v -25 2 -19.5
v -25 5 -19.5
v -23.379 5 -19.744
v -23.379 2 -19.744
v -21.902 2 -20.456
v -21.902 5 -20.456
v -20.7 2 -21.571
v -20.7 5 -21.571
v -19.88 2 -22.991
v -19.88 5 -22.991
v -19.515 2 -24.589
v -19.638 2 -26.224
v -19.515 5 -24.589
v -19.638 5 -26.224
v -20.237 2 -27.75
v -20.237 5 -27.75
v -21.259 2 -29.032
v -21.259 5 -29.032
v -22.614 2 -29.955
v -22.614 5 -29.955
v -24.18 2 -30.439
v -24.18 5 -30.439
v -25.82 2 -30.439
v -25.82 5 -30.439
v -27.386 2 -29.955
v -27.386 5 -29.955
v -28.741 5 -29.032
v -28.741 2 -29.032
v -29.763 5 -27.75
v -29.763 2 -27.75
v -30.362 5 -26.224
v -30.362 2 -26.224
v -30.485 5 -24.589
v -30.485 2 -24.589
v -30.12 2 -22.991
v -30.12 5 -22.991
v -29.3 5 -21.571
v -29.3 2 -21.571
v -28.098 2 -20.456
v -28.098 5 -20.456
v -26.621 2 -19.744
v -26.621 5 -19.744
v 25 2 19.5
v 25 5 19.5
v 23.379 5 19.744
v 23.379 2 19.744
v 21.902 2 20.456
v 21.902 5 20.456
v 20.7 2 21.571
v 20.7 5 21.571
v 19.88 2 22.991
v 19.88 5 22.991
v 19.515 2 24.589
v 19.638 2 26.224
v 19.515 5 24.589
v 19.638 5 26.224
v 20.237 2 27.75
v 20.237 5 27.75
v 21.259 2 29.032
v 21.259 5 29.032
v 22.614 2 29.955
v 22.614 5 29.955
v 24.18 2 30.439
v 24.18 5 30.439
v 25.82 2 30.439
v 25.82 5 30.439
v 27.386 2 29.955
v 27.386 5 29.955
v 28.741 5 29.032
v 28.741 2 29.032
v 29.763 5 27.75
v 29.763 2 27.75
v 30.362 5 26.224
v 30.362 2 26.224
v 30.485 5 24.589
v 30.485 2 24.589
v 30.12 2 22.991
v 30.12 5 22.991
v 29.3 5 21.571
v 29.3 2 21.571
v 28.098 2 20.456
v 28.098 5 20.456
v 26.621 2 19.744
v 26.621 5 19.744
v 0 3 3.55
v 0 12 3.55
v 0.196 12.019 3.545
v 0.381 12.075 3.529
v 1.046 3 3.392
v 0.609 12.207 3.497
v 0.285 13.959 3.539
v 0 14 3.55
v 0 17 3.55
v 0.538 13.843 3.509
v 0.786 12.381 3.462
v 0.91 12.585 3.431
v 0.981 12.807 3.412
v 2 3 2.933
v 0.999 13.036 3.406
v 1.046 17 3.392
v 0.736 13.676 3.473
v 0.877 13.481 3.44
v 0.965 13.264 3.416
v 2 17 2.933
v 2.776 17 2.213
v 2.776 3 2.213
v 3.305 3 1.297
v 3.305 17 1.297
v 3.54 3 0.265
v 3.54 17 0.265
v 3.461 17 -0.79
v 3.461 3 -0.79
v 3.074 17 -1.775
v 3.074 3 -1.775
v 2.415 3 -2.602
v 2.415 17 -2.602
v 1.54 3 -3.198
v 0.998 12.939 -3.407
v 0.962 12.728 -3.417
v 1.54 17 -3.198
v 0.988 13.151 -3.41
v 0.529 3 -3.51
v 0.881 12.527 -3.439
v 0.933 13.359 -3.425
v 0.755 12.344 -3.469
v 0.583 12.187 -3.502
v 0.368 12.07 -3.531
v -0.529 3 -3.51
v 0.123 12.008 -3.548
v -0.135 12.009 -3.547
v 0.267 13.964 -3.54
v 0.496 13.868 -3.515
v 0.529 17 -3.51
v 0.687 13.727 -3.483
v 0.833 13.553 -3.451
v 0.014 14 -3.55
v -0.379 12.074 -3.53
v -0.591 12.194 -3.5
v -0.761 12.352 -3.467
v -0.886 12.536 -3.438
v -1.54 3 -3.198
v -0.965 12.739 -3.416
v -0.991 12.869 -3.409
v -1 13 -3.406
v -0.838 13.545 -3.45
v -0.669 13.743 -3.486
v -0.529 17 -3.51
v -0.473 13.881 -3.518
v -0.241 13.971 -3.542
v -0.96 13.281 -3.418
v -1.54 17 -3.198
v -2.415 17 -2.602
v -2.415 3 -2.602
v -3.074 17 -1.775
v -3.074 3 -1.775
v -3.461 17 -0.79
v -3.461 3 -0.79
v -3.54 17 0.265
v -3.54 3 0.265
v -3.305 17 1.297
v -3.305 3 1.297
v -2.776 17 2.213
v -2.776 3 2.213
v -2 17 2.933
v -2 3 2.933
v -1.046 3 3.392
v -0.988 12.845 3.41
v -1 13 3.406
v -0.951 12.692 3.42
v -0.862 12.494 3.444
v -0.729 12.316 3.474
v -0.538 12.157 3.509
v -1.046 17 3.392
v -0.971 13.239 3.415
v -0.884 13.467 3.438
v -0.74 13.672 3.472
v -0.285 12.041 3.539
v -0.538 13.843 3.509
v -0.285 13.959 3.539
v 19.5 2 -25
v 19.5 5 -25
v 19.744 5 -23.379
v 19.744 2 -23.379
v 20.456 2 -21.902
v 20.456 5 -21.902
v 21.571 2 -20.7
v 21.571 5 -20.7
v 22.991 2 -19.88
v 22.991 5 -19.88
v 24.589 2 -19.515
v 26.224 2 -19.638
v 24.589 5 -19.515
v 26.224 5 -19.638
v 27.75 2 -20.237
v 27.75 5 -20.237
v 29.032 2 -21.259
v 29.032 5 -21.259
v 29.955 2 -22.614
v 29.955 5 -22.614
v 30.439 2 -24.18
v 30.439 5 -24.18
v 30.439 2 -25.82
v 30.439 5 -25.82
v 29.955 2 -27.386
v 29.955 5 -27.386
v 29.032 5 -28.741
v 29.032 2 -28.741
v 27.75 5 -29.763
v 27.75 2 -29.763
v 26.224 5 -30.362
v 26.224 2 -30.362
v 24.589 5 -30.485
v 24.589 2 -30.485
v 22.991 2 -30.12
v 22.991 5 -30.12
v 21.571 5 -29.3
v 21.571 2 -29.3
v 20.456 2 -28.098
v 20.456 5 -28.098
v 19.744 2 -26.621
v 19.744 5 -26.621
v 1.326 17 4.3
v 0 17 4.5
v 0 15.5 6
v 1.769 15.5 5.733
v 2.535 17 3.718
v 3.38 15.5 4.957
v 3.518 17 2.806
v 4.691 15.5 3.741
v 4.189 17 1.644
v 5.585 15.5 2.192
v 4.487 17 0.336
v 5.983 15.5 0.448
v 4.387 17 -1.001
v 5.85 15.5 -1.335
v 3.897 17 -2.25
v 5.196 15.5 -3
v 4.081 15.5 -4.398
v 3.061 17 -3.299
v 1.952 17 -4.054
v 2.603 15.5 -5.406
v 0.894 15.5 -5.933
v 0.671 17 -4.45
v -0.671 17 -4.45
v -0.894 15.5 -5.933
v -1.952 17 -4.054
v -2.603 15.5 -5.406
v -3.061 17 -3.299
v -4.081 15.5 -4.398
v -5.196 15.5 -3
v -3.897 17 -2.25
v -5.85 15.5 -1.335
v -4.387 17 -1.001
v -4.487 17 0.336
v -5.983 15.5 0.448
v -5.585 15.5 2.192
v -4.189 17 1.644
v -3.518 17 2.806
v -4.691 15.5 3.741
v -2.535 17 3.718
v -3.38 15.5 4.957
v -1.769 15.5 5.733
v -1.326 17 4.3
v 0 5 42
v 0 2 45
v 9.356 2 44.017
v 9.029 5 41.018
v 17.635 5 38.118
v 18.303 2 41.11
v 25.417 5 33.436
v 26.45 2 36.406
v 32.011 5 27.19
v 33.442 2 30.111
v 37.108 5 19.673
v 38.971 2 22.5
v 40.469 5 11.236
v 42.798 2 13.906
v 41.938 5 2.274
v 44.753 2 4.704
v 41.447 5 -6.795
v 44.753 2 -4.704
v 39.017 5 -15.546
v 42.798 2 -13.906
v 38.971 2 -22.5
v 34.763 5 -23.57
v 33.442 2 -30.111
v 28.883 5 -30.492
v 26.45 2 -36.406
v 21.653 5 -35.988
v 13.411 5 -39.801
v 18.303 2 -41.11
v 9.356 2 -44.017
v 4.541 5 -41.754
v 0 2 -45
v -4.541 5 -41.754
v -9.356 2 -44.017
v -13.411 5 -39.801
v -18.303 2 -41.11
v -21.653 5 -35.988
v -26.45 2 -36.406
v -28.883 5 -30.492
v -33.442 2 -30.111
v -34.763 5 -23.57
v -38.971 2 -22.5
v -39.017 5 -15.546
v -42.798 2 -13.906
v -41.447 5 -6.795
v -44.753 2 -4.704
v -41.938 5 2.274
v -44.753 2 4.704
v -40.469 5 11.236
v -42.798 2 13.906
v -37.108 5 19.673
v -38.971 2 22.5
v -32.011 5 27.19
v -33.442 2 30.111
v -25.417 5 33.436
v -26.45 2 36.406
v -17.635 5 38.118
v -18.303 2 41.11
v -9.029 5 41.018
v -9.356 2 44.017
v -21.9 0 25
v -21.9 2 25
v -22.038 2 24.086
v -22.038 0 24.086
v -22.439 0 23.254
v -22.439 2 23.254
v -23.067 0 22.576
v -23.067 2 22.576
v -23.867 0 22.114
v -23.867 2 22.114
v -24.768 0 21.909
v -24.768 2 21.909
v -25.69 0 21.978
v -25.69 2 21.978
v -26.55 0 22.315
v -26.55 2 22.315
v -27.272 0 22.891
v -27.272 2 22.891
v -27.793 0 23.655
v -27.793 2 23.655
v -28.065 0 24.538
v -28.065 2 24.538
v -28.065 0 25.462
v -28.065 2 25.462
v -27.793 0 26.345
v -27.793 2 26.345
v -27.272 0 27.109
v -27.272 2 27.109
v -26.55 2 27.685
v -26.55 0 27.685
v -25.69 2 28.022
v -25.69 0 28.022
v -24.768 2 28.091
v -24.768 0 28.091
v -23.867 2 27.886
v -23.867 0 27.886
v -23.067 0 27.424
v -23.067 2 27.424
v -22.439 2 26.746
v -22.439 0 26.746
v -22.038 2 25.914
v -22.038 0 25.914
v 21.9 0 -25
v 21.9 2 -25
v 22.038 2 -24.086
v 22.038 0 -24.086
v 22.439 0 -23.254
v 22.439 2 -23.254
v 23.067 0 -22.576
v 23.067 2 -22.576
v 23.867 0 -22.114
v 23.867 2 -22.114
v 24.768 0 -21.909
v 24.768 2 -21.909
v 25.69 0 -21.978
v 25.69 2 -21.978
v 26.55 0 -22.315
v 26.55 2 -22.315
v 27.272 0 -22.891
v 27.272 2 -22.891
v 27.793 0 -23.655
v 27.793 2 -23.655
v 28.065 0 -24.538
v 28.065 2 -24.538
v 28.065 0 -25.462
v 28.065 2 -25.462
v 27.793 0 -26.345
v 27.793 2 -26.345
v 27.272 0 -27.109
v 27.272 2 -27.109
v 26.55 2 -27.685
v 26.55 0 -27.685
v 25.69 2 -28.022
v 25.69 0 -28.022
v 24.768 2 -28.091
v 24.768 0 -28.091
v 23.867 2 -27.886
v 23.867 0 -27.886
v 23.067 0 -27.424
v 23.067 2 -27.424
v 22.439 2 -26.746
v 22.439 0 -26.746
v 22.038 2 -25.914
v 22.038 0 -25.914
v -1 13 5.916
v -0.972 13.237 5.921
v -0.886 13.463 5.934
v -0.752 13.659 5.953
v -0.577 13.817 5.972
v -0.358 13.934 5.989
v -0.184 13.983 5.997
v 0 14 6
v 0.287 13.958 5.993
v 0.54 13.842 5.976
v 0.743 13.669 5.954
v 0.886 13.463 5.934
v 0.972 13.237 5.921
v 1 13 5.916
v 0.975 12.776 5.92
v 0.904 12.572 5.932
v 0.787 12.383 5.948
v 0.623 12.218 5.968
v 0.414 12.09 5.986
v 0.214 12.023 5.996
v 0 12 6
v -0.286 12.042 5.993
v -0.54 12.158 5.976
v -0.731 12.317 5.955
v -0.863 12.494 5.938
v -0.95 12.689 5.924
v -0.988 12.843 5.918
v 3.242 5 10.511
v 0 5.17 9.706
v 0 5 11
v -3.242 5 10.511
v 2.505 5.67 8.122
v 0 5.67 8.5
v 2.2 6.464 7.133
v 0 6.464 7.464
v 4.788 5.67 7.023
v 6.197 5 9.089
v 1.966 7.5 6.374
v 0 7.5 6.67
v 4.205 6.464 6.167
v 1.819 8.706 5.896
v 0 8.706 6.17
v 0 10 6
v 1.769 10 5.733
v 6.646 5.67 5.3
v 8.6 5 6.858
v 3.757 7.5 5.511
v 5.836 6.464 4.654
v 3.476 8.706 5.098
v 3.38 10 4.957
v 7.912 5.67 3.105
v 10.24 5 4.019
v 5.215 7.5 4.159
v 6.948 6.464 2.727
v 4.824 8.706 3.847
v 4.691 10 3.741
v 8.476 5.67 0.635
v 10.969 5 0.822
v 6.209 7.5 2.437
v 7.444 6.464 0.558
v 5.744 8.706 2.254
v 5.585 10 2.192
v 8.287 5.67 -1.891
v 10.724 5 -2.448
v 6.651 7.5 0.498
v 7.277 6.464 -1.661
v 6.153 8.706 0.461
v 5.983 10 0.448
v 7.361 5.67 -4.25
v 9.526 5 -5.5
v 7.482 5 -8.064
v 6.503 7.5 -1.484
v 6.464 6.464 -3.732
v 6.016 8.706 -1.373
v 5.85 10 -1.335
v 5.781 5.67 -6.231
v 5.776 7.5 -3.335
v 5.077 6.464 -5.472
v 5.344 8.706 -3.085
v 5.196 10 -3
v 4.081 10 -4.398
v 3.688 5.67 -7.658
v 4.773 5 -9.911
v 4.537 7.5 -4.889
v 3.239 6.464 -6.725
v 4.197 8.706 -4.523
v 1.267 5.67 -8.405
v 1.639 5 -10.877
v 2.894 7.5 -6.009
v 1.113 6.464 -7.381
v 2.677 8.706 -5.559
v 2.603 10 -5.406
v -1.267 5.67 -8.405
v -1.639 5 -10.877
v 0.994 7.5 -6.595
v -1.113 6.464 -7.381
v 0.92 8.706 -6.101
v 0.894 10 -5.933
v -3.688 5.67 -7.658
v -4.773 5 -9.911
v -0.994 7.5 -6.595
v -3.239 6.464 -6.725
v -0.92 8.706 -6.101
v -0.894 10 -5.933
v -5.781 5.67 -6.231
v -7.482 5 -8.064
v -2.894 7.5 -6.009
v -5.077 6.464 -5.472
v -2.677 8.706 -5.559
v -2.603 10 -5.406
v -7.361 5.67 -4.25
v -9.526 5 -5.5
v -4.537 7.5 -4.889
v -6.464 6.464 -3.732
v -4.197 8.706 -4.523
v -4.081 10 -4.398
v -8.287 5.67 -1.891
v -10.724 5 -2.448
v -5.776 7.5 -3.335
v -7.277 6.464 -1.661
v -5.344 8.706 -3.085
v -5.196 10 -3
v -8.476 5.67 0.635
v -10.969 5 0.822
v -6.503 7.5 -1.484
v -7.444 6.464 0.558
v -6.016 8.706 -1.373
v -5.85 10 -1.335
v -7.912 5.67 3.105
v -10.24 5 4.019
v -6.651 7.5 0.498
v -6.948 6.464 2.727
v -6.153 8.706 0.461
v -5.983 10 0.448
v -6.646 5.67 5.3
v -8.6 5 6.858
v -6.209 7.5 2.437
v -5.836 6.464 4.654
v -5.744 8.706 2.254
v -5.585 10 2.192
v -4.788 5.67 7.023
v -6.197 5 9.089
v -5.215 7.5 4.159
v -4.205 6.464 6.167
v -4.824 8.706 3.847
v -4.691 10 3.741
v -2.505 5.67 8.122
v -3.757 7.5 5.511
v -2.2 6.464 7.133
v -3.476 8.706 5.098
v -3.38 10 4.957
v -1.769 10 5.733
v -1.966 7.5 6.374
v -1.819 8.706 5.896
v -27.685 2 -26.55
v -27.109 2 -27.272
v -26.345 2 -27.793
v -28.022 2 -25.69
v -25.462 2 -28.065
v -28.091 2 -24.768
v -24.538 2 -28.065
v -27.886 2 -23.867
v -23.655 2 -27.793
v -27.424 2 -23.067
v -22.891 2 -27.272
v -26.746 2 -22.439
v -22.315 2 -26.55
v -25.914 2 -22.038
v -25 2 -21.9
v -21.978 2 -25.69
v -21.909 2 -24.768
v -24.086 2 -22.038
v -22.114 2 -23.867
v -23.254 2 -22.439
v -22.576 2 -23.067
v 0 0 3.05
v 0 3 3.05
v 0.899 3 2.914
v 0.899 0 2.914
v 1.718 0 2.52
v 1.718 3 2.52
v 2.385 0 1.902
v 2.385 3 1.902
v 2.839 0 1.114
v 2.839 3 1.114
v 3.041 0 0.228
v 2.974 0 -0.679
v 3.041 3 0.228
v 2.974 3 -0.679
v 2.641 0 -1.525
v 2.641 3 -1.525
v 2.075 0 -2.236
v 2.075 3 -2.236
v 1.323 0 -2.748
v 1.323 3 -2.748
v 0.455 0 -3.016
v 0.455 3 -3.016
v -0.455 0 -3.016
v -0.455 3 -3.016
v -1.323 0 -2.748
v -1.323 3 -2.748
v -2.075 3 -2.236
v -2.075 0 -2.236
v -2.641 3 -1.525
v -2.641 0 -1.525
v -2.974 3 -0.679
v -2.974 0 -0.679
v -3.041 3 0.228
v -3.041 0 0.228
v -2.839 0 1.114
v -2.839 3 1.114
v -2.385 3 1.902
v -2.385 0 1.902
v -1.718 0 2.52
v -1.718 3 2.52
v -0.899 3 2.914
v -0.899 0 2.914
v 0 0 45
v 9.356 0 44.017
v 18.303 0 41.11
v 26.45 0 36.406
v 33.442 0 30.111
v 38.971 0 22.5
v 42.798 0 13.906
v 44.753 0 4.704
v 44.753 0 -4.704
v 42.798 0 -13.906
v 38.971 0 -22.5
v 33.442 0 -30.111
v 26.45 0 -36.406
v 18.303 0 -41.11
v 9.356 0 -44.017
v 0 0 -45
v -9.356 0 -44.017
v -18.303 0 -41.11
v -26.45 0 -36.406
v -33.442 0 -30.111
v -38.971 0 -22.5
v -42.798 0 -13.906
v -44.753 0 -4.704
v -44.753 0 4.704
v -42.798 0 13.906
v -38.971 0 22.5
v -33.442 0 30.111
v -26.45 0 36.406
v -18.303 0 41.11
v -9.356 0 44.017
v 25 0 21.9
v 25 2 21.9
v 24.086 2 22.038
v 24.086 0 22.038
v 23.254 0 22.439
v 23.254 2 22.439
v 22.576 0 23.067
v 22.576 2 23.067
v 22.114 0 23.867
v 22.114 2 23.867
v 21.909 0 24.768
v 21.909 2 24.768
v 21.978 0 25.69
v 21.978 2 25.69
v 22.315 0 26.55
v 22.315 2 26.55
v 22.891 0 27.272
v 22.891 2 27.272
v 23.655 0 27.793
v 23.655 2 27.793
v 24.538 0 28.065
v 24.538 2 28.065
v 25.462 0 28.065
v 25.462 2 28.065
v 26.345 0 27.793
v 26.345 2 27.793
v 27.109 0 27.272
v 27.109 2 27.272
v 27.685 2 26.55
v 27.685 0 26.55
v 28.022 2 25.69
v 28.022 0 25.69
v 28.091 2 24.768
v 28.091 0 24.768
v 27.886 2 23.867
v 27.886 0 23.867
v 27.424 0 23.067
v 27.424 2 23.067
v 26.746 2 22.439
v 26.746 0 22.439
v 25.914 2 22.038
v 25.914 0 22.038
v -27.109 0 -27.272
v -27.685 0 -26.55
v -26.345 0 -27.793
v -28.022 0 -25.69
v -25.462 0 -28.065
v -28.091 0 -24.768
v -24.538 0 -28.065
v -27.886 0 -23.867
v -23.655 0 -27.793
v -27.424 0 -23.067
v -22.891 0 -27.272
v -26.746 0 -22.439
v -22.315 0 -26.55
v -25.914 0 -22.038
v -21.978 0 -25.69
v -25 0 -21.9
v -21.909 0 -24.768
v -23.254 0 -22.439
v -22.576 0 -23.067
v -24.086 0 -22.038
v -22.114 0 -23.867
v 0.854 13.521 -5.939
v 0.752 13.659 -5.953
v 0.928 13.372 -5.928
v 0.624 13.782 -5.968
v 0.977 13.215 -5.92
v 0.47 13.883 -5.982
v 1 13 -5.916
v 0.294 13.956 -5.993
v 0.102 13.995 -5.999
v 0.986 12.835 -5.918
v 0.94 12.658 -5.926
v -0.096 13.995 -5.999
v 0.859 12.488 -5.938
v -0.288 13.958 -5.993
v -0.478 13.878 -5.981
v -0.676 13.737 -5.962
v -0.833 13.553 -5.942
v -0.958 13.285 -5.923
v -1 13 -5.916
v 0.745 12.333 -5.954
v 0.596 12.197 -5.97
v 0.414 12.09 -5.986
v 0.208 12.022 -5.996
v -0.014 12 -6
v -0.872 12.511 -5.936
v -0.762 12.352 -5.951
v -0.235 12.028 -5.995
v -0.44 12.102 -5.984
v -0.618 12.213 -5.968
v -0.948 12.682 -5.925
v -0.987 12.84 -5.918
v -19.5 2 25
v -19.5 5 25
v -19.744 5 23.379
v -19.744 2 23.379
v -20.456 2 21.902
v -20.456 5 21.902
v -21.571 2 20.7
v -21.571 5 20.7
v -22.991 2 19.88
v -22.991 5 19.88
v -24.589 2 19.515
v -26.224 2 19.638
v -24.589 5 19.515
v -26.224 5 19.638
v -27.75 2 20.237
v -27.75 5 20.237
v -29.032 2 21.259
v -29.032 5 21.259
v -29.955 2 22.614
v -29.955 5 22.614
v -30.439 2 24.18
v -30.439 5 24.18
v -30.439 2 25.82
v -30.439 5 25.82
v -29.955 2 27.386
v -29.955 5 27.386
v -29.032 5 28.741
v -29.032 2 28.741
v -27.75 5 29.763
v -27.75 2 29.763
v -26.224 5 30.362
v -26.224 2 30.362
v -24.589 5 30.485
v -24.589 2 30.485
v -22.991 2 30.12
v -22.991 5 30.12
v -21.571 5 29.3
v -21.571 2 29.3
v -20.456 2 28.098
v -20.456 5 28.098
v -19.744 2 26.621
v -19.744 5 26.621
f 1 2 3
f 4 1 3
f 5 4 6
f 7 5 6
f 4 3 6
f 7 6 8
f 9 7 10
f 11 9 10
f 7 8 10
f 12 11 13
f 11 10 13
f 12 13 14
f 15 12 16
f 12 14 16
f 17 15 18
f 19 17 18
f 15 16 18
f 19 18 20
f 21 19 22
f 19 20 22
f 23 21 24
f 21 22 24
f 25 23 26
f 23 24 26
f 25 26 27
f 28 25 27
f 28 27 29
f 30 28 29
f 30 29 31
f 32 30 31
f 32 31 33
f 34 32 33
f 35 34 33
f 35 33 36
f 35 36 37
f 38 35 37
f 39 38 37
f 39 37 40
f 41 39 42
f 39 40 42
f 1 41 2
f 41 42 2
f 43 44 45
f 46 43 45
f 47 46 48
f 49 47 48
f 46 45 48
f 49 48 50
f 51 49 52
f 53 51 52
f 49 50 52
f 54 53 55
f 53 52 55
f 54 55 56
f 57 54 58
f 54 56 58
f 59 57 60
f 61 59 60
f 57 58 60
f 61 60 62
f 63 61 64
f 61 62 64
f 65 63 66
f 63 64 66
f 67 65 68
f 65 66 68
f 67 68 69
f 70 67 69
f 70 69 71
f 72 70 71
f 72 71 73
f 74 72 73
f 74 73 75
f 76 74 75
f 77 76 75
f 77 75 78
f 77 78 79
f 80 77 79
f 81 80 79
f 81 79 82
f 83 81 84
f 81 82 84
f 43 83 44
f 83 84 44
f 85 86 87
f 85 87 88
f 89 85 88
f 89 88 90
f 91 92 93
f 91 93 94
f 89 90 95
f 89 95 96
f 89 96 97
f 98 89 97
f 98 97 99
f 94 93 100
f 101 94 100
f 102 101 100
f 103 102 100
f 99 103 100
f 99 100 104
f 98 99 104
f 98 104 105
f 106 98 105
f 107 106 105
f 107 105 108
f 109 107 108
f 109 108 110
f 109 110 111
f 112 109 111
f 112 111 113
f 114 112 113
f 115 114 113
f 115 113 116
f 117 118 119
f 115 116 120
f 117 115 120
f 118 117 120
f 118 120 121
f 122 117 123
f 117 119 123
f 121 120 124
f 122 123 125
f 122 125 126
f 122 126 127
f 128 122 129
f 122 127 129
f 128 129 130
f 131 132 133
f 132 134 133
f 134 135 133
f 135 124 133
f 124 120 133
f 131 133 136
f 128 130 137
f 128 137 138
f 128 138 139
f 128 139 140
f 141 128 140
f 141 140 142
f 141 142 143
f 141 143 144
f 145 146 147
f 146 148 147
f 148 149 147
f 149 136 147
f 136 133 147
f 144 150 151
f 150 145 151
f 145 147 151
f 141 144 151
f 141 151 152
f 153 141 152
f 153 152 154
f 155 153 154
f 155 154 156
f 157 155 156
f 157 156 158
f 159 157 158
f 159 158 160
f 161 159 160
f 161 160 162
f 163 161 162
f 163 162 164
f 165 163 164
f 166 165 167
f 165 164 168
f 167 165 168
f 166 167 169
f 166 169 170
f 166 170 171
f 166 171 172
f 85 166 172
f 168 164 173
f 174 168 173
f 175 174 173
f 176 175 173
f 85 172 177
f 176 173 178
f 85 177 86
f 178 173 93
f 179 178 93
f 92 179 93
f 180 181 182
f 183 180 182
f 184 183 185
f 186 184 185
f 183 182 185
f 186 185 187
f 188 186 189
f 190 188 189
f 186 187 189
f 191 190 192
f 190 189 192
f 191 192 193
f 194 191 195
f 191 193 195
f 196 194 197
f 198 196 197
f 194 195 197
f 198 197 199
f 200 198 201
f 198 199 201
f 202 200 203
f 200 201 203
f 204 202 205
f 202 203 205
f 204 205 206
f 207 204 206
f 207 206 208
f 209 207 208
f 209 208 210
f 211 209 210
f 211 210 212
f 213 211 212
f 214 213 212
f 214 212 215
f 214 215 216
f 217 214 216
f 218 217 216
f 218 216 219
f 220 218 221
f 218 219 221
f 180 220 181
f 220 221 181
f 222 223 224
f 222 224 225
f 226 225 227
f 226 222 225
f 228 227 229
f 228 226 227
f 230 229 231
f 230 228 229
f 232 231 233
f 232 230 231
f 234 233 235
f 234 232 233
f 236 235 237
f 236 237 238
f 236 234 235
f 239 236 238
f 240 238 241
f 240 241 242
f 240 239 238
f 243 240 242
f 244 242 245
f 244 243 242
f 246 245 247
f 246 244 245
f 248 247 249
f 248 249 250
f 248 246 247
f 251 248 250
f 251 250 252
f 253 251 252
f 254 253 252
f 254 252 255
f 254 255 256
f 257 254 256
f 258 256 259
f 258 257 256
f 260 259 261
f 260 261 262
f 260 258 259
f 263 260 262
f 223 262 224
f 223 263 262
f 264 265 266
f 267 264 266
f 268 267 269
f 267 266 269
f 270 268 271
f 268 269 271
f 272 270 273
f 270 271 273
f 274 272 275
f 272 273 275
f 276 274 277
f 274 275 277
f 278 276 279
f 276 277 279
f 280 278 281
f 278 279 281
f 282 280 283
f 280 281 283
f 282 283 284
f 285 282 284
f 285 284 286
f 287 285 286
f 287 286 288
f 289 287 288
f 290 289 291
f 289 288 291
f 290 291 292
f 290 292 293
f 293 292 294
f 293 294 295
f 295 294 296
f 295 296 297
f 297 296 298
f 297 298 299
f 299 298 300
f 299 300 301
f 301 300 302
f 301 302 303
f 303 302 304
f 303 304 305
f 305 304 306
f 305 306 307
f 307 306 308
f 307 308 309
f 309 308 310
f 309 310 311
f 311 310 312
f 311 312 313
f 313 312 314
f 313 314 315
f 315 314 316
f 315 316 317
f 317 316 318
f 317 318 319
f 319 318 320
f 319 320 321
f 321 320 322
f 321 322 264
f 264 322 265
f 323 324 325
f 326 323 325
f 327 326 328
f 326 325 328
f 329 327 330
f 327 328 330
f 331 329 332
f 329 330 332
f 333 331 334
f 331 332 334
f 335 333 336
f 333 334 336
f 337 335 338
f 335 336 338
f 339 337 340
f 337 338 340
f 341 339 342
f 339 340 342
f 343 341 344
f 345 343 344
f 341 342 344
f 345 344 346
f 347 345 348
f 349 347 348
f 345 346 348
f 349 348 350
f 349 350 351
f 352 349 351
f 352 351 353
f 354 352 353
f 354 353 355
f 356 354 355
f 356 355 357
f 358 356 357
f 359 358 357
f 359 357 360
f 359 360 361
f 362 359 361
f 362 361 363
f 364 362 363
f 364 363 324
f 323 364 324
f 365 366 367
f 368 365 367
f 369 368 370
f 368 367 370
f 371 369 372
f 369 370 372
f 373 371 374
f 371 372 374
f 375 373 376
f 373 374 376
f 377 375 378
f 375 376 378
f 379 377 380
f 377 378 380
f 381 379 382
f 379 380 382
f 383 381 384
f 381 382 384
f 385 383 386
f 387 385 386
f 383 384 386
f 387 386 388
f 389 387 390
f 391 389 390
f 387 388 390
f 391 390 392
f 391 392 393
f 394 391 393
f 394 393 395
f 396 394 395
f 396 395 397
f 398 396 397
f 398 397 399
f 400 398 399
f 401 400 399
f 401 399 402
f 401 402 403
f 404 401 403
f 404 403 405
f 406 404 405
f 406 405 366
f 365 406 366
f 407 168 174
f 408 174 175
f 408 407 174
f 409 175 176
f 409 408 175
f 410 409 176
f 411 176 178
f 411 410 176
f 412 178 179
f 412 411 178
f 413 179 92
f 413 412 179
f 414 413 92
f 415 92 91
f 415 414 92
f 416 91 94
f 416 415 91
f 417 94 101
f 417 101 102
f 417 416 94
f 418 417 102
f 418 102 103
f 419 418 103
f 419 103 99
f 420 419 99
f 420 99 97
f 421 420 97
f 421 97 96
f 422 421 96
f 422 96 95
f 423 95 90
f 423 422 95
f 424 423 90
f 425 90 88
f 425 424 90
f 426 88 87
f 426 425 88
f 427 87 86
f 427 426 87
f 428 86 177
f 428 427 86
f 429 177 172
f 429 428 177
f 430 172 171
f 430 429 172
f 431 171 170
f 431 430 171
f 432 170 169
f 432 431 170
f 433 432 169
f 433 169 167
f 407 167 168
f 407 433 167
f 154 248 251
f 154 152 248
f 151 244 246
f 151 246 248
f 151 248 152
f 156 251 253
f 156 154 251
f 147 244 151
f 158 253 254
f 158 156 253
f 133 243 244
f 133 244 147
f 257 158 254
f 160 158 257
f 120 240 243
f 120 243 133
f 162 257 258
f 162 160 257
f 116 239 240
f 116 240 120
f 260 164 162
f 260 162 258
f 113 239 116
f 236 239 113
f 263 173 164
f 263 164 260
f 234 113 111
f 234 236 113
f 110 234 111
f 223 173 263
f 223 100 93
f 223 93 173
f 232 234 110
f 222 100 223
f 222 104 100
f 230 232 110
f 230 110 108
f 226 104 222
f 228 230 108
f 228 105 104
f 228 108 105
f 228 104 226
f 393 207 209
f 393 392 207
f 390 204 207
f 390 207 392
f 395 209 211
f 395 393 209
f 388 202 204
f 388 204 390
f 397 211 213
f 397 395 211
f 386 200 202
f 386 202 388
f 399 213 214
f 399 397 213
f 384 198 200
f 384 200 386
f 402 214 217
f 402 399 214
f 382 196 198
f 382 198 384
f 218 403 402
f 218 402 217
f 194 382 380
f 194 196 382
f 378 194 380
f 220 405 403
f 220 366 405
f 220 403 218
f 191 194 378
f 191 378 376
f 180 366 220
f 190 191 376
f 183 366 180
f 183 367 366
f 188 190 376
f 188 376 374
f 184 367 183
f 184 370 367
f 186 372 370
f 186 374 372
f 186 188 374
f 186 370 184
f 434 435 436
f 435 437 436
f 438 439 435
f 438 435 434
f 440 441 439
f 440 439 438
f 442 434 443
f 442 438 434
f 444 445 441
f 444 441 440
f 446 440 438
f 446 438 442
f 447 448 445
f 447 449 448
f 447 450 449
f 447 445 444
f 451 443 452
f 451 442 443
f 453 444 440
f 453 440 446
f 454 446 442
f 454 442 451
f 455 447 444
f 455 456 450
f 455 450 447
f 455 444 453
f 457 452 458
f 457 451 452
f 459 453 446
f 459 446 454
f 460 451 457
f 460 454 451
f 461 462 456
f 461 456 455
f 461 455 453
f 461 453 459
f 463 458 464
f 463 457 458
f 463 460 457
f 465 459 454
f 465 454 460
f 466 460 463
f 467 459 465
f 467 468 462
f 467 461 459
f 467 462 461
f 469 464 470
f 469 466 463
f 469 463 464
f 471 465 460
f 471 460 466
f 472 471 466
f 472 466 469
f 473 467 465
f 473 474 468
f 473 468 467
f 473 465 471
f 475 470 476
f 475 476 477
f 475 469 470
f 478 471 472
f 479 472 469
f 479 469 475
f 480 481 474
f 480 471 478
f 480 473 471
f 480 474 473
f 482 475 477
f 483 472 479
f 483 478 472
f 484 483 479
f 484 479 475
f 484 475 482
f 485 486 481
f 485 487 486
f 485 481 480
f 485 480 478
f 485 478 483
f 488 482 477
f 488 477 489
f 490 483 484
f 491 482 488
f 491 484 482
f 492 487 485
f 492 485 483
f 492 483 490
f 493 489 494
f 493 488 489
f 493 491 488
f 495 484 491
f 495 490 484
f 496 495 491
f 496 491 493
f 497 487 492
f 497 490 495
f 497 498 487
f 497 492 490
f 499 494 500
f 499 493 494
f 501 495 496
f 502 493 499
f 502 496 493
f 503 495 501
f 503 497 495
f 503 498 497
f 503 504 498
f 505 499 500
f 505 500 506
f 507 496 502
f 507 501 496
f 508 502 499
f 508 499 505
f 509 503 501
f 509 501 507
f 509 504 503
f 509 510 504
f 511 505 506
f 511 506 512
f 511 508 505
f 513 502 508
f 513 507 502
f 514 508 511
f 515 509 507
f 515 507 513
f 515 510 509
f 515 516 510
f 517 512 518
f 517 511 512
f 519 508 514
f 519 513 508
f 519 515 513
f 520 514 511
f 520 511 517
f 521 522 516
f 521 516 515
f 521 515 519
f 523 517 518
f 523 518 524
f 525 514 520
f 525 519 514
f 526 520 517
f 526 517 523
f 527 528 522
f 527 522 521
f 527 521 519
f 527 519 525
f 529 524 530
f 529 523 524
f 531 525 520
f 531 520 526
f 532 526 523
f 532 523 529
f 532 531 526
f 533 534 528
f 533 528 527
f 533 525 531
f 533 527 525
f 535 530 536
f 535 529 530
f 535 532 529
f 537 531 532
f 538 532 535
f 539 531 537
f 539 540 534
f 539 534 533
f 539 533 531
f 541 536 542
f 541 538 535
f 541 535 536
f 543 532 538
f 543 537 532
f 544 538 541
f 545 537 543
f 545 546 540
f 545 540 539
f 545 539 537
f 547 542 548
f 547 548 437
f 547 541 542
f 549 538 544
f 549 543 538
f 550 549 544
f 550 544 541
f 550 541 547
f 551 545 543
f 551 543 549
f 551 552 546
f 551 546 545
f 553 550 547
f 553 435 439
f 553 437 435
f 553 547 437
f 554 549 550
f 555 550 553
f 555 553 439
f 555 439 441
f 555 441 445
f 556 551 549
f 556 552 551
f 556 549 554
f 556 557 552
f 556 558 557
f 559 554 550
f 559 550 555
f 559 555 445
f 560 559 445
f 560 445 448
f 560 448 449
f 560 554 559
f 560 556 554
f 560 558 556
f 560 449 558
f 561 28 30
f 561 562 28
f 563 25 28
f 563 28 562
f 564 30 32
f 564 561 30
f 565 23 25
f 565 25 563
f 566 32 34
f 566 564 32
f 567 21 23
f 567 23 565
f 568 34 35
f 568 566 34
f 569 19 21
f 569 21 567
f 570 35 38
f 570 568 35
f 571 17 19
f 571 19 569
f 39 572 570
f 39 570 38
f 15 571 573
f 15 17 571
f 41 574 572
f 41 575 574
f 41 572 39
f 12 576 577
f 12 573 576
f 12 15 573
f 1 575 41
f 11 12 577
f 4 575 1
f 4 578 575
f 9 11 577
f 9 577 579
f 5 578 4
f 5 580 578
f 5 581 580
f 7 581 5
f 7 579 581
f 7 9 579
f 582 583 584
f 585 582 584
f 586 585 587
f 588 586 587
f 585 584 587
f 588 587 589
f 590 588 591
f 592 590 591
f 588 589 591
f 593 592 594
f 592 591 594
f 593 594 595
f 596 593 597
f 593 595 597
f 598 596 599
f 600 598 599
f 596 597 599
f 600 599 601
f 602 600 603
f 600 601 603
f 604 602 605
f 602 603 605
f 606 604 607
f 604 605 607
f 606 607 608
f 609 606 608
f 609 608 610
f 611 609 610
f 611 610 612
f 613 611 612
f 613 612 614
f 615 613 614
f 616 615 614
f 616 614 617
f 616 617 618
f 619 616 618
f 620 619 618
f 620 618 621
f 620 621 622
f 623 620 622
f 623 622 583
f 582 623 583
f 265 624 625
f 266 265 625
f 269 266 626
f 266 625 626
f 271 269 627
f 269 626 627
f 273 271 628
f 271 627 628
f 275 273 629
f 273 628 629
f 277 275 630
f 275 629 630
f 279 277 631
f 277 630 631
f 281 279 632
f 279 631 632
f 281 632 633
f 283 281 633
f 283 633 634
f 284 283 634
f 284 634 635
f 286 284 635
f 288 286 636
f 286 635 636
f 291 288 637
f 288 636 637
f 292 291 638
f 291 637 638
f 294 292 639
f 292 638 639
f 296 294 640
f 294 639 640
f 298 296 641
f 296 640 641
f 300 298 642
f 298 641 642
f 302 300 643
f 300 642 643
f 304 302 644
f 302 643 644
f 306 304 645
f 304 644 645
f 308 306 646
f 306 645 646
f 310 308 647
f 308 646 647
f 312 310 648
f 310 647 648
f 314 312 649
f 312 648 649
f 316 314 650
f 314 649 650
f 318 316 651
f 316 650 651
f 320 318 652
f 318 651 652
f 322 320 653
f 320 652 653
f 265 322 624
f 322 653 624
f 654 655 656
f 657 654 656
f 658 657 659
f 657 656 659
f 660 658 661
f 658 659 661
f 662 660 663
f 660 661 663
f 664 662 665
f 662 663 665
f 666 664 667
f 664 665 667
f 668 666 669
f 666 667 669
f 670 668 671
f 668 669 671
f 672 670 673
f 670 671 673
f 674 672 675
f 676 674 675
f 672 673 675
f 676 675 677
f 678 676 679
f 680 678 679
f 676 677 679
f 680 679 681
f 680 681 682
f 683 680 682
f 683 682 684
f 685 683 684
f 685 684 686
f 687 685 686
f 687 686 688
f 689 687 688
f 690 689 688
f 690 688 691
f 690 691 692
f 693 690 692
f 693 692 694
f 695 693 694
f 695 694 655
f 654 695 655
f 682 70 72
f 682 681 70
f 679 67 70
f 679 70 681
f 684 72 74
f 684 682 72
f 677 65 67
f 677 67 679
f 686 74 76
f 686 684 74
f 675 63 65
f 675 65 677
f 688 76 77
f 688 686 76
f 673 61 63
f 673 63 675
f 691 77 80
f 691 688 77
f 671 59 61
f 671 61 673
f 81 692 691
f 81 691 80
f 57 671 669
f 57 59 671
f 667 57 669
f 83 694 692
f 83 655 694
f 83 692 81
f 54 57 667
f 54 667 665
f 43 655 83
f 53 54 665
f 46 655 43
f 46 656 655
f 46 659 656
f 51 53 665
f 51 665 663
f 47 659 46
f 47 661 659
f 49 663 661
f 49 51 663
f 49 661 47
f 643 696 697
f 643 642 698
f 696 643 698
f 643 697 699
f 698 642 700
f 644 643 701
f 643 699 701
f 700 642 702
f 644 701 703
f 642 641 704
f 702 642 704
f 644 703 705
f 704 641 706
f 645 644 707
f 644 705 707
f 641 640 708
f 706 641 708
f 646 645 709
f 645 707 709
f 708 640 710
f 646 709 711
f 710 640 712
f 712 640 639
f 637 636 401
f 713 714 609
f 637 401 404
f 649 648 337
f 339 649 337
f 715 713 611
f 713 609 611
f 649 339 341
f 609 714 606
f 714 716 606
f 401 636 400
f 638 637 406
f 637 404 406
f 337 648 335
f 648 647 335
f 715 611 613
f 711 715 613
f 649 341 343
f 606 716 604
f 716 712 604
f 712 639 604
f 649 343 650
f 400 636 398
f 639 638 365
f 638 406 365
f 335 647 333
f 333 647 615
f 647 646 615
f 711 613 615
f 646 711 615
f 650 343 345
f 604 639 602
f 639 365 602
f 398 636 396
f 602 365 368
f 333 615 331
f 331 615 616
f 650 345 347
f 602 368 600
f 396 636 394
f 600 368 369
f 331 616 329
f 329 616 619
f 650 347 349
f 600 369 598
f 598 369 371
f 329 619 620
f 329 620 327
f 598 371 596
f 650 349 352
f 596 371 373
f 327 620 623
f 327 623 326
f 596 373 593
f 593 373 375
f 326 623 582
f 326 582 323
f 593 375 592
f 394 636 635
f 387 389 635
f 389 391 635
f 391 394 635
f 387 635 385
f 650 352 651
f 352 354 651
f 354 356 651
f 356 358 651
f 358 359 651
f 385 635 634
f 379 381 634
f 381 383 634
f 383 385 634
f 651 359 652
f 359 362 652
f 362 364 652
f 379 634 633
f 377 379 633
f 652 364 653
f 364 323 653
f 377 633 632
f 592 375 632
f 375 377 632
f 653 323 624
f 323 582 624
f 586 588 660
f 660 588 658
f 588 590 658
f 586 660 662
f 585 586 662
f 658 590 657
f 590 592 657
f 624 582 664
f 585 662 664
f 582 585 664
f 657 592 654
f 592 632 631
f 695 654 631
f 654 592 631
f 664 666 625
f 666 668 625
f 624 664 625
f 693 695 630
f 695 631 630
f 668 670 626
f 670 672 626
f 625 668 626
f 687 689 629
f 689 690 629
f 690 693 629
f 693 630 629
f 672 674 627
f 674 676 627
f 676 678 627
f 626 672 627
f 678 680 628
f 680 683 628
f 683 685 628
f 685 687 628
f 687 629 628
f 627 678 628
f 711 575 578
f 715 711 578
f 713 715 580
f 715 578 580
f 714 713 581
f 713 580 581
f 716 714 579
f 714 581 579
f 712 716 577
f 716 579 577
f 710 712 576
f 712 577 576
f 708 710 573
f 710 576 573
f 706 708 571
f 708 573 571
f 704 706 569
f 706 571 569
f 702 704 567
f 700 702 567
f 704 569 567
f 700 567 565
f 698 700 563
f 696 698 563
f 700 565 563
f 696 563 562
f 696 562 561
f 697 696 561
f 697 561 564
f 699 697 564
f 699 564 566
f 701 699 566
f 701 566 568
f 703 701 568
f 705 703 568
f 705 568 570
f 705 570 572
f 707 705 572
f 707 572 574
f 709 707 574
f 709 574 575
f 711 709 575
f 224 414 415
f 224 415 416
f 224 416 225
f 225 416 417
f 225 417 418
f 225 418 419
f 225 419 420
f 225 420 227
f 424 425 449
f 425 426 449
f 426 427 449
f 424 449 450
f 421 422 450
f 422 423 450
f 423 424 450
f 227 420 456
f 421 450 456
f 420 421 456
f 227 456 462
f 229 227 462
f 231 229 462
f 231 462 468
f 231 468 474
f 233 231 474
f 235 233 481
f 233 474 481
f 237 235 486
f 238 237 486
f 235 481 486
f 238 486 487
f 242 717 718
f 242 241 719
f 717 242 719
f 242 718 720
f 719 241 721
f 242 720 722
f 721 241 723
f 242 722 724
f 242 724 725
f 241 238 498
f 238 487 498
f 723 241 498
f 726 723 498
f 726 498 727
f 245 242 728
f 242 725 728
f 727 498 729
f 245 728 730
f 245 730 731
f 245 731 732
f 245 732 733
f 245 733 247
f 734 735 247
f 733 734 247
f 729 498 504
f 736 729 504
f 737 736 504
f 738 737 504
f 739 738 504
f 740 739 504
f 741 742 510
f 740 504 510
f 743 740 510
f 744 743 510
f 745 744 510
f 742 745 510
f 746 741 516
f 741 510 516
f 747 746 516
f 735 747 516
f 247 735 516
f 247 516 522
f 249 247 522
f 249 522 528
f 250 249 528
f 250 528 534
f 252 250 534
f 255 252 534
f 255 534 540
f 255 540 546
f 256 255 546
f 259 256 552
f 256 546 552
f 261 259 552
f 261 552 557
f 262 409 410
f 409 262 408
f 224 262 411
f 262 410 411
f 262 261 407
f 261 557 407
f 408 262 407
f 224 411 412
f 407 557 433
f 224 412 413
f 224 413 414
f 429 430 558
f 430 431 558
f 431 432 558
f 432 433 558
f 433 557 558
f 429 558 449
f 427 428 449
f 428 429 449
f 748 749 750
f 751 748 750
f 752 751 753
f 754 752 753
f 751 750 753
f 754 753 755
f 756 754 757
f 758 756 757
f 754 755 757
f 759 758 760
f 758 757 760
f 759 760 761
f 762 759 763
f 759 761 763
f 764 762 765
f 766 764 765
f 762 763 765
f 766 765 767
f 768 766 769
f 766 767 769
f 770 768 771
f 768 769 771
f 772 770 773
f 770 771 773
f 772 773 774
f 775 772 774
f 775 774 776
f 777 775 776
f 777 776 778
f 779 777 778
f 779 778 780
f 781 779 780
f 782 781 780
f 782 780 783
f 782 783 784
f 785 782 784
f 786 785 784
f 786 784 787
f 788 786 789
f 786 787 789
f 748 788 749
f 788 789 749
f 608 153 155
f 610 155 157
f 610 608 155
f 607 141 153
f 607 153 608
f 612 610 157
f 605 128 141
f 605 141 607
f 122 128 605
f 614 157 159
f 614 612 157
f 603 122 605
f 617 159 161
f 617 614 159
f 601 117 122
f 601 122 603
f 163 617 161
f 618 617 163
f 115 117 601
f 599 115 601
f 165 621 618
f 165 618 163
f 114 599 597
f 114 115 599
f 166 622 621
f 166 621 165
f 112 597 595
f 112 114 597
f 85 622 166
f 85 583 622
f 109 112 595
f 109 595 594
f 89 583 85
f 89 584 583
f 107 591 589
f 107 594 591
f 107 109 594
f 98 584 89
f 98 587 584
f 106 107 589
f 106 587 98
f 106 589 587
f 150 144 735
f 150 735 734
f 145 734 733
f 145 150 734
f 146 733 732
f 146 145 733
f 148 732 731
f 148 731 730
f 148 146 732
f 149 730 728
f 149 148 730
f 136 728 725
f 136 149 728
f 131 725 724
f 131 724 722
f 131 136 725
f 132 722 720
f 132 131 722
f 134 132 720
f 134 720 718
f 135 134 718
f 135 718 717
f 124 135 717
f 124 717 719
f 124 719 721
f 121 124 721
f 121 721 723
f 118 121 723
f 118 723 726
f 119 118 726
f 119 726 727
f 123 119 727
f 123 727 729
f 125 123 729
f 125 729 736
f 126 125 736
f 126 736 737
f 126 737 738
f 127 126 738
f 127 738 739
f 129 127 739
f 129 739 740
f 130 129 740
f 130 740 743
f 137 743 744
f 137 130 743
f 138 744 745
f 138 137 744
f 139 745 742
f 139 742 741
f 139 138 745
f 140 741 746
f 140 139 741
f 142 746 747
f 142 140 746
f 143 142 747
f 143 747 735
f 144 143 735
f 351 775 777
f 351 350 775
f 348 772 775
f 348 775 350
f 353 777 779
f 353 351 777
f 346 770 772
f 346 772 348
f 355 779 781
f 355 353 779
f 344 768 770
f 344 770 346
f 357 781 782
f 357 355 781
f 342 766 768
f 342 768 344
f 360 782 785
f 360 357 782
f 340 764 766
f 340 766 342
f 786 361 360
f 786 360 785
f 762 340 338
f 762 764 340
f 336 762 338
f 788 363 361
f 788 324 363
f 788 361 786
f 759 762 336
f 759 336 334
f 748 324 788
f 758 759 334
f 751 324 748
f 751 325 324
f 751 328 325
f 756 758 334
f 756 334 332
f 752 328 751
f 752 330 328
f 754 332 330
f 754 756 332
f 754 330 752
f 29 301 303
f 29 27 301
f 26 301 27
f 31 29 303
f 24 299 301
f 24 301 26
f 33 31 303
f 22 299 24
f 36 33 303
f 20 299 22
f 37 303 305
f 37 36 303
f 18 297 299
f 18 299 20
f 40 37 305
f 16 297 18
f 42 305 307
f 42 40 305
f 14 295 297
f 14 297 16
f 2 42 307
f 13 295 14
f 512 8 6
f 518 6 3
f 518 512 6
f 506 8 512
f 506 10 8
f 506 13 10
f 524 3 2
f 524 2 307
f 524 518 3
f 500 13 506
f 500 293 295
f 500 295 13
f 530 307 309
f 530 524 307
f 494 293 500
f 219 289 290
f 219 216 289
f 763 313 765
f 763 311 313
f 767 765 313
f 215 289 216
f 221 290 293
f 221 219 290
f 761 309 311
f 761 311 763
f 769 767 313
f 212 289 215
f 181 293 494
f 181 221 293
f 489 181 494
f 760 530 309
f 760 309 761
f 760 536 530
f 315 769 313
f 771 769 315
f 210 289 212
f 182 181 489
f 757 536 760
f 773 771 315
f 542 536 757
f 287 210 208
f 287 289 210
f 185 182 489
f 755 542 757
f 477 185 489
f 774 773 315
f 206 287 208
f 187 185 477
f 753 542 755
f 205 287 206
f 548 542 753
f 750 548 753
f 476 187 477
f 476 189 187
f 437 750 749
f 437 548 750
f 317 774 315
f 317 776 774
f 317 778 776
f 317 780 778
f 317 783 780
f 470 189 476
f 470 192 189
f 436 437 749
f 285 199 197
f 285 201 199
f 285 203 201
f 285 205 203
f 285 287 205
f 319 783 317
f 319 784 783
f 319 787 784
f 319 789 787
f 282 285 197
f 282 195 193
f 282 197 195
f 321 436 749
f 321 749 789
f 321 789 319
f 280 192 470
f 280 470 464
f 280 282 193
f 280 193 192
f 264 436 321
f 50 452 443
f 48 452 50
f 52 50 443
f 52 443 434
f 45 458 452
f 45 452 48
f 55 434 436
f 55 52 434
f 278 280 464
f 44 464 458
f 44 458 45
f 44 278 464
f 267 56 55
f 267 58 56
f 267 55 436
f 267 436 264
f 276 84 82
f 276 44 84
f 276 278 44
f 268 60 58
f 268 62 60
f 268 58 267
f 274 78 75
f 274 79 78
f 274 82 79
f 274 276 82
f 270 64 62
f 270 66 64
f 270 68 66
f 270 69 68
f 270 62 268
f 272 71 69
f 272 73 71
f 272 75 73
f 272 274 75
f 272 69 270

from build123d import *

# Parameters (mm, degrees)
SKETCH1_R               = 45
BOSS_EXTRUDE1_DEPTH     = 5
SKETCH2_R               = 3.1
CUT_EXTRUDE1_DEPTH      = 64.835726674
SKETCH8_R               = 5.5
CUT_EXTRUDE6_DEPTH      = 3
CIRPATTERN1_COUNT       = 4
SKETCH3_R               = 6
BOSS_EXTRUDE2_DEPTH     = 12
SKETCH4_R               = 3.55
CUT_EXTRUDE2_DEPTH      = 14
SKETCH5_R               = 3.05
CUT_EXTRUDE3_DEPTH      = 66.161338231
FILLET1_R               = 5
CUT_EXTRUDE5_DEPTH      = 66.871086221
CUT_EXTRUDE5_DEPTH_BACK = 66.871086221
SKETCH7_R               = 1
CHAMFER1_SIZE           = 3
CHAMFER2_SIZE           = 1.5


with BuildPart() as part:
    # Sketch1 → Boss-Extrude1 (new body)
    with BuildSketch(Plane(origin=(0, 0, 0), x_dir=(1, 0, 0), z_dir=(0, 1, 0))):
        with Locations(Location((0, 0, 0), (0, 0, 270))):
            Circle(SKETCH1_R)
    extrude(amount=BOSS_EXTRUDE1_DEPTH)

    # Sketch2 → Cut-Extrude1 (cut, through all)
    with BuildSketch(Plane(origin=(0, 5, 0), x_dir=(1, 0, 0), z_dir=(0, 1, 0))):
        with Locations(Location((-25, 25, 0), (0, 0, 270))):
            Circle(SKETCH2_R)
    cut_extrude1 = extrude(amount=-CUT_EXTRUDE1_DEPTH, mode=Mode.SUBTRACT)

    # Sketch8 → Cut-Extrude6 (cut)
    with BuildSketch(Plane(origin=(0, 5, 0), x_dir=(1, 0, 0), z_dir=(0, 1, 0))):
        with Locations(Location((-25, 25, 0), (0, 0, 270))):
            Circle(SKETCH8_R)
    cut_extrude6 = extrude(amount=-CUT_EXTRUDE6_DEPTH, mode=Mode.SUBTRACT)

    # CirPattern1: Cut-Extrude1, Cut-Extrude6 ×4 about axis
    cirpattern1_axis = Axis((0, 0, 0), (0, 1, 0))
    add([cut_extrude1.rotate(cirpattern1_axis, i * 360 / CIRPATTERN1_COUNT) for i in range(1, CIRPATTERN1_COUNT)], mode=Mode.SUBTRACT)
    add([cut_extrude6.rotate(cirpattern1_axis, i * 360 / CIRPATTERN1_COUNT) for i in range(1, CIRPATTERN1_COUNT)], mode=Mode.SUBTRACT)

    # Sketch3 → Boss-Extrude2 (add)
    with BuildSketch(Plane(origin=(0, 5, 0), x_dir=(1, 0, 0), z_dir=(0, 1, 0))):
        with Locations(Location((0, 0, 0), (0, 0, 270))):
            Circle(SKETCH3_R)
    extrude(amount=BOSS_EXTRUDE2_DEPTH)

    # Sketch4 → Cut-Extrude2 (cut)
    with BuildSketch(Plane(origin=(0, 17, 0), x_dir=(1, 0, 0), z_dir=(0, 1, 0))):
        with Locations(Location((0, 0, 0), (0, 0, 270))):
            Circle(SKETCH4_R)
    extrude(amount=-CUT_EXTRUDE2_DEPTH, mode=Mode.SUBTRACT)

    # Sketch5 → Cut-Extrude3 (cut, through all)
    with BuildSketch(Plane(origin=(0, 3, 0), x_dir=(1, 0, 0), z_dir=(0, 1, 0))):
        with Locations(Location((0, 0, 0), (0, 0, 270))):
            Circle(SKETCH5_R)
    extrude(amount=-CUT_EXTRUDE3_DEPTH, mode=Mode.SUBTRACT)

    # Fillet1
    fillet1_edges = [part.edges().sort_by_distance(p)[0] for p in [
        (0, 5, -6),
    ]]
    fillet(fillet1_edges, radius=FILLET1_R)

    # Sketch7 → Cut-Extrude5 (cut, two sides: drawn at the far end of the back side and taken through both)
    with BuildSketch(Plane(origin=(0, 0, 0), x_dir=(-1, 0, 0), z_dir=(0, 0, -1)).offset(-CUT_EXTRUDE5_DEPTH_BACK)):
        with Locations((0, 13)):
            Circle(SKETCH7_R)
    extrude(amount=CUT_EXTRUDE5_DEPTH + CUT_EXTRUDE5_DEPTH_BACK, mode=Mode.SUBTRACT)

    # Chamfer1
    chamfer1_edges = [part.edges().sort_by_distance(p)[0] for p in [
        (0, 5, -45),
    ]]
    chamfer(chamfer1_edges, length=CHAMFER1_SIZE)

    # Chamfer2
    chamfer2_edges = [part.edges().sort_by_distance(p)[0] for p in [
        (0, 17, -6),
    ]]
    chamfer(chamfer2_edges, length=CHAMFER2_SIZE)


solid = part.part
